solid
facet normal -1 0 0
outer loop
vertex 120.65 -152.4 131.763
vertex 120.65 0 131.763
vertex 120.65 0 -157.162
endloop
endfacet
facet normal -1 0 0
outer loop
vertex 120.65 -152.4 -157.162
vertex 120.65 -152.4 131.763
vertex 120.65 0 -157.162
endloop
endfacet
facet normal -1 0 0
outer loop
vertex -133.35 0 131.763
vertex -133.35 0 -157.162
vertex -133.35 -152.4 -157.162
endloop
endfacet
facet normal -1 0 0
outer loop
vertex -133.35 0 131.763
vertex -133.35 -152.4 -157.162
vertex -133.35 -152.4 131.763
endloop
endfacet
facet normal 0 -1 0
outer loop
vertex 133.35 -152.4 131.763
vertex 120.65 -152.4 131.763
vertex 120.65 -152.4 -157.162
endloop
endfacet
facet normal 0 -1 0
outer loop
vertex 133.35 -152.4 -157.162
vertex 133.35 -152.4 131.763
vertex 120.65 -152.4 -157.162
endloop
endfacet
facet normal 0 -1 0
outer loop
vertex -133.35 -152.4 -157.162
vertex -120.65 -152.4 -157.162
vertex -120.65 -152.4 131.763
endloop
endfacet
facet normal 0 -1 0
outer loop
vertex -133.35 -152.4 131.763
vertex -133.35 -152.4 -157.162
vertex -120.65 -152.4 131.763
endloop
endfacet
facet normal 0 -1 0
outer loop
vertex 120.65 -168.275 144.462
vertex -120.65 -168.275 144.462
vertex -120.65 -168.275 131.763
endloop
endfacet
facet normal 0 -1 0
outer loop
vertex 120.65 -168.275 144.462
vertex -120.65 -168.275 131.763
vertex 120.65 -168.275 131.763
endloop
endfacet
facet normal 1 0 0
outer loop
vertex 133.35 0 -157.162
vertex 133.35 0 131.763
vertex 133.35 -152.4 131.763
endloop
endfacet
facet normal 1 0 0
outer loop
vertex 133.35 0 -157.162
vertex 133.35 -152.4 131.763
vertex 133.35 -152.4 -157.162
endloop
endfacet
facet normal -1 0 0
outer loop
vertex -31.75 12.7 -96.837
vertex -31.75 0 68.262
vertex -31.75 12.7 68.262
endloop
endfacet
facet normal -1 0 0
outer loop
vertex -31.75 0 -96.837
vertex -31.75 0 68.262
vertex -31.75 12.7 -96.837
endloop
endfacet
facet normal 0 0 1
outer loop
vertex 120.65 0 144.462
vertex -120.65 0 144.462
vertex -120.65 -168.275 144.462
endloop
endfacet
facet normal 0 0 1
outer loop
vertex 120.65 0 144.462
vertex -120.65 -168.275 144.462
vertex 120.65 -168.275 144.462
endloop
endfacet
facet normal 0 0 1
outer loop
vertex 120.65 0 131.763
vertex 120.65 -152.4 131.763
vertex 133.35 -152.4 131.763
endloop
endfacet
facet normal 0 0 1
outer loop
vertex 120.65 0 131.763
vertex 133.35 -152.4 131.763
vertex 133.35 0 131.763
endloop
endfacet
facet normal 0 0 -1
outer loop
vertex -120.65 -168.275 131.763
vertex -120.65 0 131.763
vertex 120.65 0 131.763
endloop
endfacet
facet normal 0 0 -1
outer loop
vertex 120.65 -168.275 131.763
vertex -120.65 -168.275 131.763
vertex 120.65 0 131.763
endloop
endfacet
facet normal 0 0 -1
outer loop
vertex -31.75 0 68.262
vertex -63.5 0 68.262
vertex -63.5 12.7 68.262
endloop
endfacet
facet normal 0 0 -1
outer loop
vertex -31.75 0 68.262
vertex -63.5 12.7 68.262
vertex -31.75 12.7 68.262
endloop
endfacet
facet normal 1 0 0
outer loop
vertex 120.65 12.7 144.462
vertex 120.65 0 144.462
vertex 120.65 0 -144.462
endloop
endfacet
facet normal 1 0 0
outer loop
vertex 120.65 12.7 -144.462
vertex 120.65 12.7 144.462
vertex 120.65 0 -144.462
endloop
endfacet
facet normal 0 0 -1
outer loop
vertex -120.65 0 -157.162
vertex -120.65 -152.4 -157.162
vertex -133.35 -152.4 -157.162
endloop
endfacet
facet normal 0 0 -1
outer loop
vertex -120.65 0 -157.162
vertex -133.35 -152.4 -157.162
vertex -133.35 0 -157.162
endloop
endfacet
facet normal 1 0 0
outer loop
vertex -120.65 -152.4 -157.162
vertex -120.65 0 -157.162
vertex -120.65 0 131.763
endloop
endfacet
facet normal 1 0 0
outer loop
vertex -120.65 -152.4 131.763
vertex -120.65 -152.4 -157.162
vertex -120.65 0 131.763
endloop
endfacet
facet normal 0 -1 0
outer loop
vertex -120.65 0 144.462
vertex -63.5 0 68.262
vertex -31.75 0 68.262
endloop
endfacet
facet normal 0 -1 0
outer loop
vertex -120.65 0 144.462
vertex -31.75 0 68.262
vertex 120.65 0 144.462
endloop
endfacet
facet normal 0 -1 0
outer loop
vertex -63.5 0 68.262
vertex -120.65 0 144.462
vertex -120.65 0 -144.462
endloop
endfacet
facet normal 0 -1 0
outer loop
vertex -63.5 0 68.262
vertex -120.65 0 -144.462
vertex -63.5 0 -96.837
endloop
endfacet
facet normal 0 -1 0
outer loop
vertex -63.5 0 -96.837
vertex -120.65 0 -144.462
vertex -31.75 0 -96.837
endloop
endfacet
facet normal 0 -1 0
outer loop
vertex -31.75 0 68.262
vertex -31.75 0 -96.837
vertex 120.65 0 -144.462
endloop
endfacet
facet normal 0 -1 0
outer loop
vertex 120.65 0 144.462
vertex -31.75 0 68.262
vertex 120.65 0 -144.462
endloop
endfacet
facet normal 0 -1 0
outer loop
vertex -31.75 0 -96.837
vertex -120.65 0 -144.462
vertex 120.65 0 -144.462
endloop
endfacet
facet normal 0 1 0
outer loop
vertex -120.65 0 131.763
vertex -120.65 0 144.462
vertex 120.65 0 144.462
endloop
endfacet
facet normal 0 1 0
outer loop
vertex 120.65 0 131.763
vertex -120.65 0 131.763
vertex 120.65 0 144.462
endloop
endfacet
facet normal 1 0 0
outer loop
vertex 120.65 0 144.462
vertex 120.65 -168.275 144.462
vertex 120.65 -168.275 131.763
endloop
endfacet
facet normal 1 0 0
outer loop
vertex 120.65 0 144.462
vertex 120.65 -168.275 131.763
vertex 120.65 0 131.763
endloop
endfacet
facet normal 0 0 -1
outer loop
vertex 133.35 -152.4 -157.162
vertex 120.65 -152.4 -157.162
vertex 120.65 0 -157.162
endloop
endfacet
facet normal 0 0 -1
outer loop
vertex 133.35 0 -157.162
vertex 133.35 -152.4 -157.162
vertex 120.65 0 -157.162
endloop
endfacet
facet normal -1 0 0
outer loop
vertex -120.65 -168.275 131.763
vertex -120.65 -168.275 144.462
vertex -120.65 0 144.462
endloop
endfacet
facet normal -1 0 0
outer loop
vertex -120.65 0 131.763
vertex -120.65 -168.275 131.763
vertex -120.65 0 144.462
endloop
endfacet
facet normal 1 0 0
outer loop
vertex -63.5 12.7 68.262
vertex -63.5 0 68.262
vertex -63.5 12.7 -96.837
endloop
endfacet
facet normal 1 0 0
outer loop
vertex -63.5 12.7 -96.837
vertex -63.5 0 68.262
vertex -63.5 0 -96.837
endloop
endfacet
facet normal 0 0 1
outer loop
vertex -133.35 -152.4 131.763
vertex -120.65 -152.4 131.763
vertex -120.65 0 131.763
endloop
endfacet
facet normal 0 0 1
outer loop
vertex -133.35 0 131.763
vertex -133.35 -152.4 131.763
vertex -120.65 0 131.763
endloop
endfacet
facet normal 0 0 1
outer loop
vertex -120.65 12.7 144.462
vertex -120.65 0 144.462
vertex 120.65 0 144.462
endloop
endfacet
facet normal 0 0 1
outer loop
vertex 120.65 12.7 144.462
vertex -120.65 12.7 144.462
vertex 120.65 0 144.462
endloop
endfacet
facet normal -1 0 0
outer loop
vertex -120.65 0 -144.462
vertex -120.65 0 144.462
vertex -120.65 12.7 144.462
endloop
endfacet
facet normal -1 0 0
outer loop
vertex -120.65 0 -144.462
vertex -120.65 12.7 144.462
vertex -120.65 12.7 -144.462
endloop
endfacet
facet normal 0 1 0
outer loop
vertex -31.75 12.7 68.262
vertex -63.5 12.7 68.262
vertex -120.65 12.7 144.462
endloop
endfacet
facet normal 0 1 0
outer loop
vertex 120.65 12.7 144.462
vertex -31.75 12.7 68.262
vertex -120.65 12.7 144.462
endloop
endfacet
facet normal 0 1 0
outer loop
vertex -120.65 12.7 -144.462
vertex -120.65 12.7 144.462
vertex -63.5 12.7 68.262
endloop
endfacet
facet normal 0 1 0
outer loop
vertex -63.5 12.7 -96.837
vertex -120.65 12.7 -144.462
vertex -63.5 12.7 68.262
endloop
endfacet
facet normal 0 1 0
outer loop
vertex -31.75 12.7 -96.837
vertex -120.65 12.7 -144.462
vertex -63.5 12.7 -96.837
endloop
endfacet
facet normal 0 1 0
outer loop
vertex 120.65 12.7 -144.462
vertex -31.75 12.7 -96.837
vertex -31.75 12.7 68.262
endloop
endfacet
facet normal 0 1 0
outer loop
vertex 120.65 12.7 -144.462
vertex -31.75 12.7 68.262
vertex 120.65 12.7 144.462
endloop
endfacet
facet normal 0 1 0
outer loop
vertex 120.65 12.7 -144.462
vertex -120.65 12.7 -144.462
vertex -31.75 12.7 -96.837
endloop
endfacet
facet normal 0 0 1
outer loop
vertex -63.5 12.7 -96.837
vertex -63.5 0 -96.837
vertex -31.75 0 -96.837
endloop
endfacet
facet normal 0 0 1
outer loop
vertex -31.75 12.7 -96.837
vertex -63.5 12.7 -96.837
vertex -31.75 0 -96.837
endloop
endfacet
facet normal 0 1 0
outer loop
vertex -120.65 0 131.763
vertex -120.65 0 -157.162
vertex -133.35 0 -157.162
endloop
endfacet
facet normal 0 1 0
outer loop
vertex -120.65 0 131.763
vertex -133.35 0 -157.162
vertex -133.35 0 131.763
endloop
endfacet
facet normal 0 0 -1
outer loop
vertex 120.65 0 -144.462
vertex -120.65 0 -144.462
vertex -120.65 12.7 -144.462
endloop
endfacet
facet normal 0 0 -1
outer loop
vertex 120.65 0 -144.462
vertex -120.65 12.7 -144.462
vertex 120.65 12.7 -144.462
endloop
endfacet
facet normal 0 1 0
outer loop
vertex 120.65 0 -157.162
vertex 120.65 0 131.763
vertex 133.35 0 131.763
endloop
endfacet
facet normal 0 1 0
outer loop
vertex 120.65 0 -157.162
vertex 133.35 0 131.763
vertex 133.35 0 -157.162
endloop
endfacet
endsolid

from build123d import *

# Parameters (mm, degrees)
SKETCH1_W           = 241.3
SKETCH1_H           = 288.925
SKETCH1_W_2         = 31.75
SKETCH1_H_2         = 165.1
BOSS_EXTRUDE1_DEPTH = 12.7
SKETCH2_W           = 241.3
SKETCH2_H           = 168.275
BOSS_EXTRUDE3_DEPTH = 12.7
SKETCH3_W           = 288.925
SKETCH3_H           = 152.4
BOSS_EXTRUDE4_DEPTH = 12.7
SKETCH5_W           = 288.925
SKETCH5_H           = 152.4
BOSS_EXTRUDE6_DEPTH = 12.7


with BuildPart() as part:
    # Sketch1 → Boss-Extrude1 (new body)
    with BuildSketch(Plane(origin=(0, 0, 0), x_dir=(1, 0, 0), z_dir=(0, 1, 0))):
        Rectangle(SKETCH1_W, SKETCH1_H)
        with Locations((-47.625, 14.2875)):
            Rectangle(SKETCH1_W_2, SKETCH1_H_2, mode=Mode.SUBTRACT)
    extrude(amount=BOSS_EXTRUDE1_DEPTH)


with BuildPart() as body_2:
    # Sketch2 → Boss-Extrude3 (new body)
    with BuildSketch(Plane.XY.offset(144.4625)):
        with Locations((0, -84.1375)):
            Rectangle(SKETCH2_W, SKETCH2_H)
    extrude(amount=-BOSS_EXTRUDE3_DEPTH)


with BuildPart() as body_3:
    # Sketch3 → Boss-Extrude4 (new body)
    with BuildSketch(Plane(origin=(120.65, 0, 0), x_dir=(0, 0, -1), z_dir=(1, 0, 0))):
        with Locations((12.7, -76.2)):
            Rectangle(SKETCH3_W, SKETCH3_H)
    extrude(amount=BOSS_EXTRUDE4_DEPTH)


with BuildPart() as body_4:
    # Sketch5 → Boss-Extrude6 (new body)
    with BuildSketch(Plane.ZY.offset(120.65)):
        with Locations((-12.7, -76.2)):
            Rectangle(SKETCH5_W, SKETCH5_H)
    extrude(amount=BOSS_EXTRUDE6_DEPTH)


solid = Compound([part.part, body_2.part, body_3.part, body_4.part])
